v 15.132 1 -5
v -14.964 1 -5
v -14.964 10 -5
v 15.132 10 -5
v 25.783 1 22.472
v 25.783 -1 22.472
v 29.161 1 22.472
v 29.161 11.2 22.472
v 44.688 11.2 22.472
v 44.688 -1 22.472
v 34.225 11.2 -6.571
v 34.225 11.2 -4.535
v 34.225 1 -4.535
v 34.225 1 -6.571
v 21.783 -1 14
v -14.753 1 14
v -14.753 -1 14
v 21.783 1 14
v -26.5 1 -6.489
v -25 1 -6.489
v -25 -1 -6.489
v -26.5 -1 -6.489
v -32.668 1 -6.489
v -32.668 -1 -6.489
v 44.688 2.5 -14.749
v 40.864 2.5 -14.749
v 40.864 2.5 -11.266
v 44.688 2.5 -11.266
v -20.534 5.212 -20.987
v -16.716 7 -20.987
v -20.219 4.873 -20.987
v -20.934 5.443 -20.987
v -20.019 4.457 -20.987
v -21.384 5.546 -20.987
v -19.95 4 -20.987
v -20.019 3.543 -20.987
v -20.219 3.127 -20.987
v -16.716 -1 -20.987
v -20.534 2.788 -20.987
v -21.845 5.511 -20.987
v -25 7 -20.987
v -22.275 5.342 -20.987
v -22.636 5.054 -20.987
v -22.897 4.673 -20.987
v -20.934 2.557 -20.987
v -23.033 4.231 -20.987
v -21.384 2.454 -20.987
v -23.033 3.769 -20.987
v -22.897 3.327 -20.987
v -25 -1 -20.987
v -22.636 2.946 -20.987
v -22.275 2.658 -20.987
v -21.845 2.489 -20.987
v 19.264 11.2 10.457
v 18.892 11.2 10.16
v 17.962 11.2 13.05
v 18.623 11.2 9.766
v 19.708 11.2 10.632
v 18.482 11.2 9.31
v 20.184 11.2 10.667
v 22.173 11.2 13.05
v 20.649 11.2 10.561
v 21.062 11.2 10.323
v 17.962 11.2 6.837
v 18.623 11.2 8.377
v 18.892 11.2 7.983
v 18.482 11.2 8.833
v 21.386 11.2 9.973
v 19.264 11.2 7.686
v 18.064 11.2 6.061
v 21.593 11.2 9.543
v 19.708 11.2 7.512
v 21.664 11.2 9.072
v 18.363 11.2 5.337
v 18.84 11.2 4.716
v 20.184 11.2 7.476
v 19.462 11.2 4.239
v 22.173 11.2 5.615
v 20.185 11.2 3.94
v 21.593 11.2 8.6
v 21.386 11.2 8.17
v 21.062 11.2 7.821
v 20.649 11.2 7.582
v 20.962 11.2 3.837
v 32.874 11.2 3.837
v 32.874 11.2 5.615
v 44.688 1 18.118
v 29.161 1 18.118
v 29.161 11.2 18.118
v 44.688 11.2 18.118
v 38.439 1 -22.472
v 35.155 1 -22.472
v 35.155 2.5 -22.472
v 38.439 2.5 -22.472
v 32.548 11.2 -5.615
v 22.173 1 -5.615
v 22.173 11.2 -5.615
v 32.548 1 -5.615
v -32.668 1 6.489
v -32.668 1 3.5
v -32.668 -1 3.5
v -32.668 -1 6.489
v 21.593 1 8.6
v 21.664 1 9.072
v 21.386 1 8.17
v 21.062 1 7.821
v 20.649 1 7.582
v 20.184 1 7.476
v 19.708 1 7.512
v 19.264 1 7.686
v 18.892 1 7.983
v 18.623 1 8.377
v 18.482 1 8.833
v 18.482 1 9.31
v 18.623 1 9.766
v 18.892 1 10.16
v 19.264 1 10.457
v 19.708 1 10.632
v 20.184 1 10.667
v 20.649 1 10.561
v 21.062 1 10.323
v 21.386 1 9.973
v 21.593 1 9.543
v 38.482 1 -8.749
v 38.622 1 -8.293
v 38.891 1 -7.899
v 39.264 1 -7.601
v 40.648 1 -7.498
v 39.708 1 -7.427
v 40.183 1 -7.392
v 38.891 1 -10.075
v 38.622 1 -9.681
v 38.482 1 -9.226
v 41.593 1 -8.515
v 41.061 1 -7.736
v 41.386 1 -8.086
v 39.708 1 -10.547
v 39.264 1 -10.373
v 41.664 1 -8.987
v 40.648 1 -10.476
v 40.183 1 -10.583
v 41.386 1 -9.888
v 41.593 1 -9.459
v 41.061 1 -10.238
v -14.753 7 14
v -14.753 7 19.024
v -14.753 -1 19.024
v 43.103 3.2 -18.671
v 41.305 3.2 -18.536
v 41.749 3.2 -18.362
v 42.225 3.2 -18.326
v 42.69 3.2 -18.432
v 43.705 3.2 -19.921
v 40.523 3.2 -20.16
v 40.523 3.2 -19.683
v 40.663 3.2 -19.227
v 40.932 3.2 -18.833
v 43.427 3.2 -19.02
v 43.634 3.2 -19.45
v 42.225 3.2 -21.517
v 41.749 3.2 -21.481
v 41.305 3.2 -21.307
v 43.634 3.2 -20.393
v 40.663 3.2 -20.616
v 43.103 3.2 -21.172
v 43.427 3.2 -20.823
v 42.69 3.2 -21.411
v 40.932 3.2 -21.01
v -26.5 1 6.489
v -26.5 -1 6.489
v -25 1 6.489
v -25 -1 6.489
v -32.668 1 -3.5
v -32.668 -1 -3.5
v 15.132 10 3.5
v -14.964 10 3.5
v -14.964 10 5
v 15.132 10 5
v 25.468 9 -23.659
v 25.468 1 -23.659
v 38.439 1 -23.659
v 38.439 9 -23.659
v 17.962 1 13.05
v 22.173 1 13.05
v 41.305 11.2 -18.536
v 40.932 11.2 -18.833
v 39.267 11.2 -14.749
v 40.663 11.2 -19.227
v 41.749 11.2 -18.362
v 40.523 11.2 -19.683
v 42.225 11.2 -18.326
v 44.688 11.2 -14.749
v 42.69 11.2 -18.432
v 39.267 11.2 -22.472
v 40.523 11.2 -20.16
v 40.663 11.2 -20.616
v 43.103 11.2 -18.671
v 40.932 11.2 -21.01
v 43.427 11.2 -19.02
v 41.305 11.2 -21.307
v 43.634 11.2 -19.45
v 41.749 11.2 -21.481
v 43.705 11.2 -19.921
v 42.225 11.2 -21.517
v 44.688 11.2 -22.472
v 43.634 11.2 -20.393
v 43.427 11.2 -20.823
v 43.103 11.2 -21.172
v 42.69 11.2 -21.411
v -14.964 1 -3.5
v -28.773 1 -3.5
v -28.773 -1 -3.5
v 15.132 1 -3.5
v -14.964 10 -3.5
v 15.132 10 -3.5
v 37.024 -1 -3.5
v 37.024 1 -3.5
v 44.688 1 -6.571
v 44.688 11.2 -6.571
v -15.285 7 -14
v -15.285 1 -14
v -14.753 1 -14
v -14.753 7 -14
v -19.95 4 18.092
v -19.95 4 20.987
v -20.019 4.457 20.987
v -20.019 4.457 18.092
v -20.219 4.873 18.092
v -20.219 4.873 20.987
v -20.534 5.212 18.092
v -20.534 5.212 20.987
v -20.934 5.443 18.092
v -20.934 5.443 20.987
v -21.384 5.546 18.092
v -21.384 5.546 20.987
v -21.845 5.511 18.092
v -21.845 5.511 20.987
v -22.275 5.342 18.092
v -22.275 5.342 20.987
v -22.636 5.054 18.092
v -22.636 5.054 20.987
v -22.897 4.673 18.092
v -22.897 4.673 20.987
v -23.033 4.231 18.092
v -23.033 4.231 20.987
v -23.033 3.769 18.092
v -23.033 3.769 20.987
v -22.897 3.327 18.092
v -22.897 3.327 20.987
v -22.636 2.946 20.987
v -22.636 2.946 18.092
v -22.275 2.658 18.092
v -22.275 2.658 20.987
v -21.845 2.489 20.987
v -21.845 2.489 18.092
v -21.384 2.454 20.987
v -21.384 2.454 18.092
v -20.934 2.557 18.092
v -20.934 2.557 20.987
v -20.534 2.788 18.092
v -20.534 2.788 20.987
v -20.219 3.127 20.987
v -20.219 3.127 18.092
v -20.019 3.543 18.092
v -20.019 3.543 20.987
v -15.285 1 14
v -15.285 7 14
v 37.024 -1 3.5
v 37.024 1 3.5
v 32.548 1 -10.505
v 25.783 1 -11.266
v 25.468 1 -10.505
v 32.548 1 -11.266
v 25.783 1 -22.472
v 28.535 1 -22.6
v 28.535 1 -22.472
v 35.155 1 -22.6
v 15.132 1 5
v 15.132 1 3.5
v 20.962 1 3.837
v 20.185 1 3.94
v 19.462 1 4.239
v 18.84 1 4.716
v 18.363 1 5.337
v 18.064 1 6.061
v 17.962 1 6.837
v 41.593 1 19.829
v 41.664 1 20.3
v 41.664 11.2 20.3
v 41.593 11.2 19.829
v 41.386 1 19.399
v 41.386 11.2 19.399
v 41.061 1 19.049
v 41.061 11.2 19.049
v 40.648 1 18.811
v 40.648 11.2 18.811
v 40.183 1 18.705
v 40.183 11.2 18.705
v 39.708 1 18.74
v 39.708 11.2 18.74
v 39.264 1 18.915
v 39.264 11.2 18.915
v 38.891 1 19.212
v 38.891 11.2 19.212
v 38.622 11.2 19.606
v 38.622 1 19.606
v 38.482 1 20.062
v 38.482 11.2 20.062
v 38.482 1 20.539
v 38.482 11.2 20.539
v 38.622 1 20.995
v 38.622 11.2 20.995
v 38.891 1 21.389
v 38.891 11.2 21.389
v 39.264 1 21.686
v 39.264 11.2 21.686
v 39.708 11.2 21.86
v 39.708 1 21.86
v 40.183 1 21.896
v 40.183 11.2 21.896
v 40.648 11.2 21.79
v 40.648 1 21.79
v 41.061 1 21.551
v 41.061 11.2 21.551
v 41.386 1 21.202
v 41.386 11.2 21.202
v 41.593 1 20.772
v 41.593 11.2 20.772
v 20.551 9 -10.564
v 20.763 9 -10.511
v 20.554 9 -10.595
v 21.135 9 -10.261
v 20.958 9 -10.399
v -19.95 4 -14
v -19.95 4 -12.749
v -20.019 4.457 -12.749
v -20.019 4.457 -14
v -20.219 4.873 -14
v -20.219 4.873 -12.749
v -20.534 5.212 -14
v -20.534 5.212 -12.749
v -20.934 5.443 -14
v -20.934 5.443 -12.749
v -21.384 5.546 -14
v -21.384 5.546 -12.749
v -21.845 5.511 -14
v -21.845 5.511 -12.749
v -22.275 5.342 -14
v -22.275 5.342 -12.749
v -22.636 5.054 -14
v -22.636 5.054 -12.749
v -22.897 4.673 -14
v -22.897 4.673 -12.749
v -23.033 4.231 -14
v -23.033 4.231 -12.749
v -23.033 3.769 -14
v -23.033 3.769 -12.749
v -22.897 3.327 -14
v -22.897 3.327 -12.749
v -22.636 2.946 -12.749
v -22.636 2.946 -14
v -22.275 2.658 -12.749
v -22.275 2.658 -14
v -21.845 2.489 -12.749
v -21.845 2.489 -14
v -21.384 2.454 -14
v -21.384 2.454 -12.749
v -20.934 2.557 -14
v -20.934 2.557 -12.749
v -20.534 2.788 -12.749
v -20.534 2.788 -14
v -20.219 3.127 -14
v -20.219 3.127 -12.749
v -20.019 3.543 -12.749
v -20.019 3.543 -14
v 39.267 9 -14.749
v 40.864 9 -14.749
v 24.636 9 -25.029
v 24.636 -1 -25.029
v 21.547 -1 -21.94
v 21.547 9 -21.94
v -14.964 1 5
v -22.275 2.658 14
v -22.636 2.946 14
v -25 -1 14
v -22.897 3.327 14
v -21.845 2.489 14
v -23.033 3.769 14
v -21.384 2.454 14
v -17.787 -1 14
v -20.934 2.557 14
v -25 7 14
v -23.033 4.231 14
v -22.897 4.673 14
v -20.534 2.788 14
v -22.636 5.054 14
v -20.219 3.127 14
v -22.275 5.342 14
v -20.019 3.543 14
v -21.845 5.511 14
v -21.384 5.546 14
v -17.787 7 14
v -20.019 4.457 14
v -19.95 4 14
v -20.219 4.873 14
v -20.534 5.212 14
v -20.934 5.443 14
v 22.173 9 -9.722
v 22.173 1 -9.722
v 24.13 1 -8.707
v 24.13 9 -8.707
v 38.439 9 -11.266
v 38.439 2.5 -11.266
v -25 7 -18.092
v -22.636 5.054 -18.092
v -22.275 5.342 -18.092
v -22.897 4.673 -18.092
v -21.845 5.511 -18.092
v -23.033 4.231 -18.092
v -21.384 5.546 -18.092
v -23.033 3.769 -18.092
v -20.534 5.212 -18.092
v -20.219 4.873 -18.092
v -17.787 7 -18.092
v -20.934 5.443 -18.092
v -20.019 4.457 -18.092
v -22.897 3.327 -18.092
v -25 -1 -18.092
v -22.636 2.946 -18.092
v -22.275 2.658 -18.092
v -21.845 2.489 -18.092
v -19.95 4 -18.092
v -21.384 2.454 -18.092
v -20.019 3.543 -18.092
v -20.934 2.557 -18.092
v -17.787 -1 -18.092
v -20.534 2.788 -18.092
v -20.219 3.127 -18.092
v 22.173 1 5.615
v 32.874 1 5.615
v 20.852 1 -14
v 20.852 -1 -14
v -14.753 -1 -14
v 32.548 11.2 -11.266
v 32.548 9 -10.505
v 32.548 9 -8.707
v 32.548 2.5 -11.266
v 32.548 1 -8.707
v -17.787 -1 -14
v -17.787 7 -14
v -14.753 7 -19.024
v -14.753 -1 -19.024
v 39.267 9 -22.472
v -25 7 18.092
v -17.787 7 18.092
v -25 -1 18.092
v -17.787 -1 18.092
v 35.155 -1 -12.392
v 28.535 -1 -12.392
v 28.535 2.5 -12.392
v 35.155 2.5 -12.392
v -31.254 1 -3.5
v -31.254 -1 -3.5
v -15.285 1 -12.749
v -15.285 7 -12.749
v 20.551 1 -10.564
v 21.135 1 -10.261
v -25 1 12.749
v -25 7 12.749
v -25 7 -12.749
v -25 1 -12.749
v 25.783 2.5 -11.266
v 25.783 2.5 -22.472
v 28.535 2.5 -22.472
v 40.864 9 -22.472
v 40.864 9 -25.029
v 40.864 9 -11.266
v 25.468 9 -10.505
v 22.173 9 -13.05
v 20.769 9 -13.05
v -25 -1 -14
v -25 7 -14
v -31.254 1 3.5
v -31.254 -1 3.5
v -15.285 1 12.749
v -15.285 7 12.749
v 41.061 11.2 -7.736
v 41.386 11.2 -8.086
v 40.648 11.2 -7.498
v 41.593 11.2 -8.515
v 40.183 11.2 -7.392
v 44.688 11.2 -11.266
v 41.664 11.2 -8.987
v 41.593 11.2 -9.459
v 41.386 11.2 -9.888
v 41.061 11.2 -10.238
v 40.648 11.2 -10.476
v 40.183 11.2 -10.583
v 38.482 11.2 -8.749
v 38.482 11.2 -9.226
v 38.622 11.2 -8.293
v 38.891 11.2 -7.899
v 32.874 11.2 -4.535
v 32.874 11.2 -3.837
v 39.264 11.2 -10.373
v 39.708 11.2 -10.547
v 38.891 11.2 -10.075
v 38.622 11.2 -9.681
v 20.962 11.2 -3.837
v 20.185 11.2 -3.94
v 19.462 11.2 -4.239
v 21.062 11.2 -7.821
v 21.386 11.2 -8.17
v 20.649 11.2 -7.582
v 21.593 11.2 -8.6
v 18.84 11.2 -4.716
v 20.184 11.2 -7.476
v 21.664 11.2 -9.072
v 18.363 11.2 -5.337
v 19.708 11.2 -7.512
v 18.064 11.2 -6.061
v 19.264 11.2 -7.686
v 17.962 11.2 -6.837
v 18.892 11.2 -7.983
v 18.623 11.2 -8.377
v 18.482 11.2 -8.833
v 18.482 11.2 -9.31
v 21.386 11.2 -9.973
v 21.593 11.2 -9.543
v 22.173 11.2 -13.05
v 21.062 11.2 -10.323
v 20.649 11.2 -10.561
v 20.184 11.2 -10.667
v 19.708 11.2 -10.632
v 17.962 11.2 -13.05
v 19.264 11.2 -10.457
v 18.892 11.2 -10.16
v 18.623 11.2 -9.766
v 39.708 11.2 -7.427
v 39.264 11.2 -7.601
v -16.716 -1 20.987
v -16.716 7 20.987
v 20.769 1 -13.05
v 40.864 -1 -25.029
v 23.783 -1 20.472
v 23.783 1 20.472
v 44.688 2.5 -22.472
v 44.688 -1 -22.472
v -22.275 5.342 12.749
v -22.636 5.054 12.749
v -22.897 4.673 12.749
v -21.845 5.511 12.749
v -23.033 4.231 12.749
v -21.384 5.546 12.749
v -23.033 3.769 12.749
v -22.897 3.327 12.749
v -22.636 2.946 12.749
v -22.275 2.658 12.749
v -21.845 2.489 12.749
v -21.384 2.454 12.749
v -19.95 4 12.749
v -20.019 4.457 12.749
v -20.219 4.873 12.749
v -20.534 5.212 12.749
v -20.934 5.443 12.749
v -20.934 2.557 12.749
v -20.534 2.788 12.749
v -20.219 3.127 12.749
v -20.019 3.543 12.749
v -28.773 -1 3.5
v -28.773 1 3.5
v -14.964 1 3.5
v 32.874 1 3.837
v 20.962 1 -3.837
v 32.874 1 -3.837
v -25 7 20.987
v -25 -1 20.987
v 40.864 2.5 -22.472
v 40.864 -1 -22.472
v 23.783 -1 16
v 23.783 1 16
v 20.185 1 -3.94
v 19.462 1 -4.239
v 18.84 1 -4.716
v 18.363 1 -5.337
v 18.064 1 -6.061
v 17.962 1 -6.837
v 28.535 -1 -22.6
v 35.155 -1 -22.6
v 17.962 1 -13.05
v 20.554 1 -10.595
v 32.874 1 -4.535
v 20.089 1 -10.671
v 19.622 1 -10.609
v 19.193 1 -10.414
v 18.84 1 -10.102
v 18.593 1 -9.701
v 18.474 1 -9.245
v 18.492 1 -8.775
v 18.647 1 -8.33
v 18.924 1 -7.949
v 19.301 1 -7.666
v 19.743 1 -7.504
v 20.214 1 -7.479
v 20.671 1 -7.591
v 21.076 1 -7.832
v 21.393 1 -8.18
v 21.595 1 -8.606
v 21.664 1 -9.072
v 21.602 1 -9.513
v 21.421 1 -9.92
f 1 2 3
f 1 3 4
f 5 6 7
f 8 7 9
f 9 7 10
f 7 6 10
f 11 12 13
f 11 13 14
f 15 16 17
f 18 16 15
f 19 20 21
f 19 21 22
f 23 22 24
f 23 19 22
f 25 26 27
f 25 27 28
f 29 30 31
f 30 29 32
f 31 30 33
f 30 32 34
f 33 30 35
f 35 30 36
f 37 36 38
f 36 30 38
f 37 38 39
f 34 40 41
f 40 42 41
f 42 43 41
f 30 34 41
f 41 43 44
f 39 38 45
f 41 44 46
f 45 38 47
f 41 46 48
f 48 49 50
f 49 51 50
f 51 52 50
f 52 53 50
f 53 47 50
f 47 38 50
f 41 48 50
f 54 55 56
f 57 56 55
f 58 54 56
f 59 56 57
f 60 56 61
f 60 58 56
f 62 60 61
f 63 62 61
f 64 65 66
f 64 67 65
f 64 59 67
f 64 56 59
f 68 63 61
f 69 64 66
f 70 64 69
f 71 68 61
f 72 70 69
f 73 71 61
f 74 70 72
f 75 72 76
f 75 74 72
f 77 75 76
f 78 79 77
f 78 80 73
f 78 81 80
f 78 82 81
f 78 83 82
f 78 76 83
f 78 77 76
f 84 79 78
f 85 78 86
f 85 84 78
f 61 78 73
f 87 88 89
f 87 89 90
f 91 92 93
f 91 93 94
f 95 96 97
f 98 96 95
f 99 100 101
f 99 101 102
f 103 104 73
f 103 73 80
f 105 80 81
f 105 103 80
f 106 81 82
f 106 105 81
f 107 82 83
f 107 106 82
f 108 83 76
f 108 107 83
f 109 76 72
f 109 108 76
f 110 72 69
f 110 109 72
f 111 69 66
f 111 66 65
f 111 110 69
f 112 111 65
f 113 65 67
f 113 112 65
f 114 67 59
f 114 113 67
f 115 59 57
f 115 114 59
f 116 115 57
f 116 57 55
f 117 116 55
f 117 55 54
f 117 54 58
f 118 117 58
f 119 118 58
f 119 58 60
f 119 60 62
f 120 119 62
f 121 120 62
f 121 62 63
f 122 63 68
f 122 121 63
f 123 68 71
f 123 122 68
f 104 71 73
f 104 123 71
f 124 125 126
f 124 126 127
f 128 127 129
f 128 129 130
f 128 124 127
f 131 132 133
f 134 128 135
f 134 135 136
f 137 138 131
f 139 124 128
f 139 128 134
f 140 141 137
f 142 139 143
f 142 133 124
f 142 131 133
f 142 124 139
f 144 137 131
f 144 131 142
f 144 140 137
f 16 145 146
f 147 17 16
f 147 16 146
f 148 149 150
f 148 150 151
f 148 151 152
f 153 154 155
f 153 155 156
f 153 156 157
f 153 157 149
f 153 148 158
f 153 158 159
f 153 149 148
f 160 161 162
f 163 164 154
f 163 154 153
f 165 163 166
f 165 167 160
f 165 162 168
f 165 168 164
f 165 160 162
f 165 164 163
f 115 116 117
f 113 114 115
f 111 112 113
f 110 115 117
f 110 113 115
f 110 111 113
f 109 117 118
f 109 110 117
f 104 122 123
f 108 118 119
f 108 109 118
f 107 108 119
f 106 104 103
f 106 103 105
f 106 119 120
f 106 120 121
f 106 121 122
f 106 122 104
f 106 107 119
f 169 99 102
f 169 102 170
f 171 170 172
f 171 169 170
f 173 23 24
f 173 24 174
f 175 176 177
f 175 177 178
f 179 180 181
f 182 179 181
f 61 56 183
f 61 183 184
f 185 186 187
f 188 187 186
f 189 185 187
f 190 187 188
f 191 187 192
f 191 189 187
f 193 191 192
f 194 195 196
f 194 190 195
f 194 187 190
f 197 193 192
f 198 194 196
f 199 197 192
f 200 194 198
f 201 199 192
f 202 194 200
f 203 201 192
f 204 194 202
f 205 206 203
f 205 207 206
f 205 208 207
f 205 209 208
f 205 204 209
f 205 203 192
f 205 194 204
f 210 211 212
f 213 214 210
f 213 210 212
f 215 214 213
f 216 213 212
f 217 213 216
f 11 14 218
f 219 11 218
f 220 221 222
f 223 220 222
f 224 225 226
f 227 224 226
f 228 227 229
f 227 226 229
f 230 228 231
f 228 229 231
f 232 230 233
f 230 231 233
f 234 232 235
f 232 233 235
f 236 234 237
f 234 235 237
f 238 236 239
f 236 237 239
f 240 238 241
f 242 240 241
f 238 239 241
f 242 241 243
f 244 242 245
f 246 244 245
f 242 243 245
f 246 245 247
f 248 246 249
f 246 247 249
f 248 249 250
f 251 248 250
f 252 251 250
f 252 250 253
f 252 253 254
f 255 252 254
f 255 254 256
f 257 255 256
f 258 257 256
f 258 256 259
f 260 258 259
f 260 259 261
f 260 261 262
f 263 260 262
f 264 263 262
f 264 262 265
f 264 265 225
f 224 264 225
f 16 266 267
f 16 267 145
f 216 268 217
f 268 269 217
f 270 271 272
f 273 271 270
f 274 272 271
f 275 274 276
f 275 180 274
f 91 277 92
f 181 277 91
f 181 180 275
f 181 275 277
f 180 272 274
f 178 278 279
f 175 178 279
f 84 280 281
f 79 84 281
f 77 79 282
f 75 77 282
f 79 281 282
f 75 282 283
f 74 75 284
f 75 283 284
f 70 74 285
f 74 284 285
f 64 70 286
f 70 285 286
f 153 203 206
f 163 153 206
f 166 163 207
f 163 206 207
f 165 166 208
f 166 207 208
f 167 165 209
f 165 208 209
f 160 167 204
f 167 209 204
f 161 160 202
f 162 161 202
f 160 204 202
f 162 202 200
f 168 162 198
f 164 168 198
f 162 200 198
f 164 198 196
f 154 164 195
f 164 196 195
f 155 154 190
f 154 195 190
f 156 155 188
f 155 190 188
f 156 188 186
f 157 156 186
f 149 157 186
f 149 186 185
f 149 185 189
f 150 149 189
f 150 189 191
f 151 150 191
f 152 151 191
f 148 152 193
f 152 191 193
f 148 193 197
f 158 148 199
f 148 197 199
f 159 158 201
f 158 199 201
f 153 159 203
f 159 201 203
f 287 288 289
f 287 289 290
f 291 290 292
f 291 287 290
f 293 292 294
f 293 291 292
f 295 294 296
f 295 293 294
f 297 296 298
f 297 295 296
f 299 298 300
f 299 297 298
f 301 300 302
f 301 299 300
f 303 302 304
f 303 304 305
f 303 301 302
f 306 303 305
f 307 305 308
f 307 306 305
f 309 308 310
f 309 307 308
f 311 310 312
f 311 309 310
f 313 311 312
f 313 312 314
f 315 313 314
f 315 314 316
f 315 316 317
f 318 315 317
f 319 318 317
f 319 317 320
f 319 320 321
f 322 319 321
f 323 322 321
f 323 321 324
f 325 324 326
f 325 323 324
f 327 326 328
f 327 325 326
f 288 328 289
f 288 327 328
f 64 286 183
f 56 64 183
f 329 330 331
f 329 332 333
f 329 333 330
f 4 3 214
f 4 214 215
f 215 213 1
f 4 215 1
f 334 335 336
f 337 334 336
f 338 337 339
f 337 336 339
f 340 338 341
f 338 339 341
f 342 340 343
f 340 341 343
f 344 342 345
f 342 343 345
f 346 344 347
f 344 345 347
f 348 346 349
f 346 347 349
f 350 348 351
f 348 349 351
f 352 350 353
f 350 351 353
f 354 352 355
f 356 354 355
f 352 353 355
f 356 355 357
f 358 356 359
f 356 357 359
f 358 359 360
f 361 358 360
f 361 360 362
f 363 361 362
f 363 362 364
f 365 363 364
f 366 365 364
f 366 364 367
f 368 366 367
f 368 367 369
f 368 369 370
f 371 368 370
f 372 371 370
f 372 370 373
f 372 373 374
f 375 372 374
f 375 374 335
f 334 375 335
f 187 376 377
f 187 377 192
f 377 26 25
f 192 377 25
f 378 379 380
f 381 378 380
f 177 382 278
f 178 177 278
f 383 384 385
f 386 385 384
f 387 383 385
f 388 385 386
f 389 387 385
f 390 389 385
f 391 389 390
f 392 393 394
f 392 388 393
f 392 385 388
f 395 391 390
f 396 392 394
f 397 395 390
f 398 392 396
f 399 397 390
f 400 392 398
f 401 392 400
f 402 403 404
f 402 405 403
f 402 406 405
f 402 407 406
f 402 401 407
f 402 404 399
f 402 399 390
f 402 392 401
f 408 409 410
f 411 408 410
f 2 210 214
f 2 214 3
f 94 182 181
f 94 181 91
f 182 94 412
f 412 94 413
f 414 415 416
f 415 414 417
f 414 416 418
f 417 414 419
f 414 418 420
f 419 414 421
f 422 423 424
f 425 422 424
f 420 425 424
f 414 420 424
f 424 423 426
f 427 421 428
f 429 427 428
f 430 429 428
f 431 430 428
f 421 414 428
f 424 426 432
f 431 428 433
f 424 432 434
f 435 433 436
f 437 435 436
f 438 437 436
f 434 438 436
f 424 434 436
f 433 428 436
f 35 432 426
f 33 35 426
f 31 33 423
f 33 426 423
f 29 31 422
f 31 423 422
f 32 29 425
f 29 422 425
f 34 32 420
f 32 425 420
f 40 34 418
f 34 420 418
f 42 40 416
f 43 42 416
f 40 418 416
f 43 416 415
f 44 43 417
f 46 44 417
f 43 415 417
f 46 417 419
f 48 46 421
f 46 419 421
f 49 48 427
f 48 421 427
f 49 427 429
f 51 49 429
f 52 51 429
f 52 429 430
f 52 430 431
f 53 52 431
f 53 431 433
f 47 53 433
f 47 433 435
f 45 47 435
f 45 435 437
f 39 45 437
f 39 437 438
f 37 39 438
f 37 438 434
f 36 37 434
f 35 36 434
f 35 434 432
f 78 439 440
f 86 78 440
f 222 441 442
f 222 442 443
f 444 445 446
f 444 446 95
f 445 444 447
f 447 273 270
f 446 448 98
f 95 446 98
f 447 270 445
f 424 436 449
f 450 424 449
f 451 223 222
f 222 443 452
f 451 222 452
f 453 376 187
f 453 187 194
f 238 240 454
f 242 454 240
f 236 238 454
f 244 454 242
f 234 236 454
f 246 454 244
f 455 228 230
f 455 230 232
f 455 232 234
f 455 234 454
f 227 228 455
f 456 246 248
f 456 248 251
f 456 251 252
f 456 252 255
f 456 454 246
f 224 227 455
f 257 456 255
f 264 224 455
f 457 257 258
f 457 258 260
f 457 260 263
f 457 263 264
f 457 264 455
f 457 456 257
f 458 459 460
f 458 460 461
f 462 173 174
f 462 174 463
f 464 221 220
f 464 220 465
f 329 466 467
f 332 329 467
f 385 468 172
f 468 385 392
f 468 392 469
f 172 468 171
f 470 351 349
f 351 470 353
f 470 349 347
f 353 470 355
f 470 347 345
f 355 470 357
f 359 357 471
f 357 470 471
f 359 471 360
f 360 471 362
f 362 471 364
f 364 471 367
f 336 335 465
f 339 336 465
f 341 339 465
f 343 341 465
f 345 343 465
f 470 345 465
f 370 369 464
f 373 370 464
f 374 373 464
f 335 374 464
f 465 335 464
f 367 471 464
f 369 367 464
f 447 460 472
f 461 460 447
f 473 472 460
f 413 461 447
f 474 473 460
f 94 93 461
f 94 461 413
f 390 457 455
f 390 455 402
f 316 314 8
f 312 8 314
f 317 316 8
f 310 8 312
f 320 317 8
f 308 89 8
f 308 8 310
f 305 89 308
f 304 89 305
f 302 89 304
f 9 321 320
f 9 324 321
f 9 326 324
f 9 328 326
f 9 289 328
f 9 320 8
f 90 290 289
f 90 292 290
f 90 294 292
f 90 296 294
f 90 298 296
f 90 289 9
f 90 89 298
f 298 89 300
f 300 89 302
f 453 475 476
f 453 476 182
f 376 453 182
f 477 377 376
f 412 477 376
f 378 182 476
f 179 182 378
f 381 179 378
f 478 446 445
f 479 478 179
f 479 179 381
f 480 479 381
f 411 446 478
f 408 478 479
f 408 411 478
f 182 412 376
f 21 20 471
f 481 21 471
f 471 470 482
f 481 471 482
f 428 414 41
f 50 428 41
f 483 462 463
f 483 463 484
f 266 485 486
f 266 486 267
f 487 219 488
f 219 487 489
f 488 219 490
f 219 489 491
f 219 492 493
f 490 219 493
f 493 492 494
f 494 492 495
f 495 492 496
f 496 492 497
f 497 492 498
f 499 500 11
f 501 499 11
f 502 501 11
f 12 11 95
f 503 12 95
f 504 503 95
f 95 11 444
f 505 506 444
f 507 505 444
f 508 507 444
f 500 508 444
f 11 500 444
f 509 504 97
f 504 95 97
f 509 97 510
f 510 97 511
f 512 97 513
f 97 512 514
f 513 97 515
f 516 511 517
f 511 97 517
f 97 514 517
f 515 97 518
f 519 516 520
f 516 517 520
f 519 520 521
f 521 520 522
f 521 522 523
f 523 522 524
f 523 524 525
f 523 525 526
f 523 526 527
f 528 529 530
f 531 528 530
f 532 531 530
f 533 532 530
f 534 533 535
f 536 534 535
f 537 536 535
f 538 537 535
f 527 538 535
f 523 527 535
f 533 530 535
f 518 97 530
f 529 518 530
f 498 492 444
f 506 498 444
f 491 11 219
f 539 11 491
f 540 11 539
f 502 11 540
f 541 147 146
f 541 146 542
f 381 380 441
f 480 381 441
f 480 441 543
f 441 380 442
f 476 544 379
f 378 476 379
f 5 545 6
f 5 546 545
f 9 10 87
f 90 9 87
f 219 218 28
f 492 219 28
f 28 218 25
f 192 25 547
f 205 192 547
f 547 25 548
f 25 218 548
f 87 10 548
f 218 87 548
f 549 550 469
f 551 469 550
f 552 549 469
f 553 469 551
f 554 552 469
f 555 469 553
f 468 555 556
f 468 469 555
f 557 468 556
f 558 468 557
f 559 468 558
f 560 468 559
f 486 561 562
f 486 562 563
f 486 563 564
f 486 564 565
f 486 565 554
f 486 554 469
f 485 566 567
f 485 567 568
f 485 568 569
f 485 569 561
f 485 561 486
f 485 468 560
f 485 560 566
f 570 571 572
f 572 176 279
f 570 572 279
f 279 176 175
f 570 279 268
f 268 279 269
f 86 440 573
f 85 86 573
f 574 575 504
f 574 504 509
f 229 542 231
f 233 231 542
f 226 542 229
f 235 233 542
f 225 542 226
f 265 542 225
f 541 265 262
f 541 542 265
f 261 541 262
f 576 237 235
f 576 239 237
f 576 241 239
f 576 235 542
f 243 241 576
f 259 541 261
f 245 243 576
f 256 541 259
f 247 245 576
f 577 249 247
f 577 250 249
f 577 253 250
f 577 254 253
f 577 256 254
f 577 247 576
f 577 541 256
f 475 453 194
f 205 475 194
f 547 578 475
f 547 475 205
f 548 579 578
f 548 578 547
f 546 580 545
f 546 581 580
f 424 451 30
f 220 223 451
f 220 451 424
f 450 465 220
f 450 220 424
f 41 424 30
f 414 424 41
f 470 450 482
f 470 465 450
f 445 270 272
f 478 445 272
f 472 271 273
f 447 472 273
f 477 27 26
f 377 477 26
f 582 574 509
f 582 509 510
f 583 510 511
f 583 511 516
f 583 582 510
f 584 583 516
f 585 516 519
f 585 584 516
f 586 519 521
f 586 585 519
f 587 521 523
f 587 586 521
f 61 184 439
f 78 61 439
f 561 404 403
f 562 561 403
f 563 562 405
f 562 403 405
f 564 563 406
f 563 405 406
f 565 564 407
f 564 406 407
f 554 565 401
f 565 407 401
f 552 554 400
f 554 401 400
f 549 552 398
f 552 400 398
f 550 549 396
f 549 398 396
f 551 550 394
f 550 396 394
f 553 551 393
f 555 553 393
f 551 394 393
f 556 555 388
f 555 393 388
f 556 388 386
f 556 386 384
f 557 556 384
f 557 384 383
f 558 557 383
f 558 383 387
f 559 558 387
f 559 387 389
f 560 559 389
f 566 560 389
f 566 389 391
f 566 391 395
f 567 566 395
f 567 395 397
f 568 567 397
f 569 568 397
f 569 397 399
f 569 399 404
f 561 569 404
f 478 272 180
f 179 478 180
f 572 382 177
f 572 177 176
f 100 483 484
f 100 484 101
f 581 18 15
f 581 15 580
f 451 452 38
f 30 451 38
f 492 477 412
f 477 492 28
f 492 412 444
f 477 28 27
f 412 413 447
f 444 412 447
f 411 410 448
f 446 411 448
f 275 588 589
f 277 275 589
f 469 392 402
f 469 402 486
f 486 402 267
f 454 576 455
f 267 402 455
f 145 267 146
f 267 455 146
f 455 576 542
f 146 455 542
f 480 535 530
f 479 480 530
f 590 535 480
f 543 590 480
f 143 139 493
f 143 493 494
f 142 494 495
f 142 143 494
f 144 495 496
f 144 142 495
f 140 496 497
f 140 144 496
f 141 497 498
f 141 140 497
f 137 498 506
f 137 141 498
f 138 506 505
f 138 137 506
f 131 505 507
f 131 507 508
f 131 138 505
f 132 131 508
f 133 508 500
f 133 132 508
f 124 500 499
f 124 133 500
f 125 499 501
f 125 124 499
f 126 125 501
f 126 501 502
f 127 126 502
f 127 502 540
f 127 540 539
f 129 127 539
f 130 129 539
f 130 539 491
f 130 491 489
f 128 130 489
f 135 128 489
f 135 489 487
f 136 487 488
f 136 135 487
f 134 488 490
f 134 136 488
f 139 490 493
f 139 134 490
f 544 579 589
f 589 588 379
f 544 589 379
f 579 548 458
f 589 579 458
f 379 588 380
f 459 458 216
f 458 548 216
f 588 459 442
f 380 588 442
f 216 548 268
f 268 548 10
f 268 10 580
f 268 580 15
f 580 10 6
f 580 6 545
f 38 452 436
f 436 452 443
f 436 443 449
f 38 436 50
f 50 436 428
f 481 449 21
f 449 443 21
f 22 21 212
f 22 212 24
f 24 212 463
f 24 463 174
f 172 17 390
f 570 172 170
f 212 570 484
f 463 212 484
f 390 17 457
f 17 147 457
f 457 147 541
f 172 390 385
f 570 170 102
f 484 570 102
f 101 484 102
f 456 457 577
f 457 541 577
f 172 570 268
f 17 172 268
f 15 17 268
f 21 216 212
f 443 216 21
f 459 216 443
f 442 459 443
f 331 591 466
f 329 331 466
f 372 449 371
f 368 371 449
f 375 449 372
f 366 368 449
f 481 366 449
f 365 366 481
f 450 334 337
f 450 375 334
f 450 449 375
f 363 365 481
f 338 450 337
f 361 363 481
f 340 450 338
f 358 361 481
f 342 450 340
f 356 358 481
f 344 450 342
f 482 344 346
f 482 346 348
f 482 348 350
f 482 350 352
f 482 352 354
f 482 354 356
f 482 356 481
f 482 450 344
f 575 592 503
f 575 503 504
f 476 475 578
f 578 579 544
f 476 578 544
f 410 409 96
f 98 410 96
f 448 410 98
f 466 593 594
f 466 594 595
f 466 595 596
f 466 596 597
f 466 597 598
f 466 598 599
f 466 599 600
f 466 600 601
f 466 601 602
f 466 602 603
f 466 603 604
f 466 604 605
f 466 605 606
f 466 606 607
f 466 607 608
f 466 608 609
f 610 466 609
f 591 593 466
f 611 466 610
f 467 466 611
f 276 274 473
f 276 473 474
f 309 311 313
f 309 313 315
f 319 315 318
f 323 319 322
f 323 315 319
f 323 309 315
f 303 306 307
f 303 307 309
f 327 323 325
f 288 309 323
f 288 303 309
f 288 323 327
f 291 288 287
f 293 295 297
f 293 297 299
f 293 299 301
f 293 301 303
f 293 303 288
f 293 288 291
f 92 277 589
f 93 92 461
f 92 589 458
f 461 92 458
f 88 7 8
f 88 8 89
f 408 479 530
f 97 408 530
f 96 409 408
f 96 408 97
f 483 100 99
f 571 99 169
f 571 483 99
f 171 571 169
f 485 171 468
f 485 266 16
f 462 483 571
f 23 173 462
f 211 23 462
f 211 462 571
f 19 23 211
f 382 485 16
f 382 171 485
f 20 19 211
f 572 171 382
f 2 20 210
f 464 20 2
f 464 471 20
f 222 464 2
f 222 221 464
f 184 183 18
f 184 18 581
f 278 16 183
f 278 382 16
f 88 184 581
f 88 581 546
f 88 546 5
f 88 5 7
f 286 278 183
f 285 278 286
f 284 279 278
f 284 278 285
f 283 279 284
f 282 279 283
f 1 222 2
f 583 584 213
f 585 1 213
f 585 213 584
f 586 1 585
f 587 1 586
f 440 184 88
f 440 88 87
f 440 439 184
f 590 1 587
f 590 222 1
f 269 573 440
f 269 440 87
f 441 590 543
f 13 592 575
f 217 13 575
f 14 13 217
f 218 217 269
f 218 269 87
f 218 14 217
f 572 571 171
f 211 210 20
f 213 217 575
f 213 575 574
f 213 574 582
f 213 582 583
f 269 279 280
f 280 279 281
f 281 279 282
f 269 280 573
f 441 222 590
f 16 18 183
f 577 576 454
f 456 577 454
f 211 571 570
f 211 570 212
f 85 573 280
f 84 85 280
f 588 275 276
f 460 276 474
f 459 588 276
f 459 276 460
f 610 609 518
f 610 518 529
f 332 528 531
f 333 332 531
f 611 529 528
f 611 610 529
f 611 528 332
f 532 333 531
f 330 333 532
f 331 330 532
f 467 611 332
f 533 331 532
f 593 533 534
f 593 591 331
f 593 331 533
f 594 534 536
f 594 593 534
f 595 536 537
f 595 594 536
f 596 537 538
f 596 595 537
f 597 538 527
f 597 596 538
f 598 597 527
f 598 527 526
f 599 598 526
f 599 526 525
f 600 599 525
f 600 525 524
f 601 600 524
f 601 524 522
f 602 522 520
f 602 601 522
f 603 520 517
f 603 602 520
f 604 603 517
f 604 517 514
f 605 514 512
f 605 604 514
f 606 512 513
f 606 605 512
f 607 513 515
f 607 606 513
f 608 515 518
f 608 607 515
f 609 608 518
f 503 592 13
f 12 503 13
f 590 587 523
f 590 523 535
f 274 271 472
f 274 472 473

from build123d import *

# Parameters (mm, degrees)
SKETCH_1_W          = 65.796682854
SKETCH_1_H          = 7
EXTRUDE_1_DEPTH     = 1
SKETCH_1_3_W        = 65.796682854
SKETCH_1_3_H        = 7
EXTRUDE_4_DEPTH     = 1
SKETCH_2_R          = 1.6
SKETCH_2_W          = 15.527024866
SKETCH_2_H          = 4.354426868
EXTRUDE_5_DEPTH     = 10.2
SKETCH_3_W          = 11.091265895
SKETCH_3_H          = 1.250873396
EXTRUDE_6_DEPTH     = 8
EXTRUDE_7_DEPTH     = 8
SKETCH_5_R          = 1.55
CUT_EXTRUDE_1_DEPTH = 46.168181955
SKETCH_6_W          = 30.095890068
SKETCH_6_H          = 1.5
EXTRUDE_8_DEPTH     = 9
SKETCH_9_R          = 1.6
EXTRUDE_9_DEPTH     = 10.2
SKETCH_10_W         = 18.90463159
SKETCH_10_H         = 11.206527224
EXTRUDE_10_DEPTH    = 1.5
EXTRUDE_11_DEPTH    = 10
SKETCH_12_W         = 6.619618948
SKETCH_12_H         = 10.208127021
CUT_EXTRUDE_2_DEPTH = 4
SKETCH_13_W         = 5.420961308
SKETCH_13_H         = 7.723522143
EXTRUDE_12_DEPTH    = 8.7
SKETCH_14_R         = 1.6
CUT_EXTRUDE_3_DEPTH = 8
SKETCH_15_W         = 1.5
SKETCH_15_H         = 14.498100707
CUT_EXTRUDE_4_DEPTH = 9


with BuildPart() as part:
    # 草图1 → 凸台-拉伸1 (new body)
    with BuildSketch(Plane(origin=(0, 0, 0), x_dir=(1, 0, 0), z_dir=(0, 1, 0))):
        Polygon((21.783137071, 14), (-26.5, 14), (-26.5, 6.489174383), (-32.668192158, 6.489174383), (-32.668192158, 4.906407062), (-32.668192158, 3.5), (-31.253928934, 3.5), (-31.253928934, -3.5), (-32.668192158, -3.5), (-32.668192158, -4.906407062), (-32.668192158, -6.489174383), (-26.5, -6.489174383), (-26.5, -14), (21.783137071, -14), (23.783137071, -16), (23.783137071, -20.472436035), (25.783137071, -22.472436035), (44.687768661, -22.472436035), (44.687768661, -14), (44.687768661, 14), (44.687768661, 22.472436035), (39.670641652, 22.472436035), (39.670641652, 24.180906865), (37.700847745, 24.180906865), (25.783137071, 24.180906865), (23.783137071, 21.491786563), (23.783137071, 20.472436035), (23.783137071, 16), align=None)
        with Locations((4.125276897, 0)):
            Rectangle(SKETCH_1_W, SKETCH_1_H, mode=Mode.SUBTRACT)
    extrude(amount=EXTRUDE_1_DEPTH)

    # 草图1<3> → 凸台-拉伸4 (add)
    with BuildSketch(Plane(origin=(0, 0, 0), x_dir=(1, 0, 0), z_dir=(0, 1, 0))):
        Polygon((21.783137071, 14), (-26.5, 14), (-26.5, 6.489174383), (-32.668192158, 6.489174383), (-32.668192158, 4.906407062), (-32.668192158, 3.5), (-31.253928934, 3.5), (-31.253928934, -3.5), (-32.668192158, -3.5), (-32.668192158, -4.906407062), (-32.668192158, -6.489174383), (-26.5, -6.489174383), (-26.5, -14), (21.783137071, -14), (23.783137071, -16), (23.783137071, -20.472436035), (25.783137071, -22.472436035), (44.687768661, -22.472436035), (44.687768661, -14), (44.687768661, 14), (44.687768661, 22.472436035), (39.670641652, 22.472436035), (39.670641652, 24.180906865), (37.700847745, 24.180906865), (25.783137071, 24.180906865), (23.783137071, 21.491786563), (23.783137071, 20.472436035), (23.783137071, 16), align=None)
        with Locations((4.125276897, 0)):
            Rectangle(SKETCH_1_3_W, SKETCH_1_3_H, mode=Mode.SUBTRACT)
    extrude(amount=-EXTRUDE_4_DEPTH)

    # 草图2 → 凸台-拉伸5 (add)
    with BuildSketch(Plane(origin=(0, 1, 0), x_dir=(1, 0, 0), z_dir=(0, 1, 0))):
        with BuildLine():
            Line((32.873825551, -3.837422495), (20.961538439, -3.837422495))
            ThreePointArc((20.961538439, -3.837422495), (18.840218096, -4.716102152), (17.961538439, -6.837422495))
            Line((17.961538439, -6.837422495), (17.961538439, -9.071638955))
            Line((17.961538439, -9.071638955), (17.961538439, -13.050495751))
            Line((17.961538439, -13.050495751), (22.173089039, -13.050495751))
            Line((22.173089039, -13.050495751), (22.173089039, -9.071638955))
            Line((22.173089039, -9.071638955), (22.173089039, -5.615284864))
            Line((22.173089039, -5.615284864), (32.873825551, -5.615284864))
            Line((32.873825551, -5.615284864), (32.873825551, -3.837422495))
        make_face()
        with Locations((20.064403013, -9.071638955)):
            Circle(SKETCH_2_R, mode=Mode.SUBTRACT)
        Polygon((34.225317019, 6.570554911), (44.687768661, 6.570554911), (44.687768661, 11.265908811), (32.547793792, 11.265908811), (32.547793792, 4.534516494), (34.225317019, 4.534516494), align=None)
        with Locations((40.063673511, 8.987084634)):
            Circle(SKETCH_2_R, mode=Mode.SUBTRACT)
        with Locations((36.924256228, -20.295222601)):
            Rectangle(SKETCH_2_W, SKETCH_2_H)
        with Locations((40.063673511, -20.300345076)):
            Circle(SKETCH_2_R, mode=Mode.SUBTRACT)
    extrude(amount=EXTRUDE_5_DEPTH)

    # 草图3 → 凸台-拉伸6 (add)
    with BuildSketch(Plane.XZ.offset(1)):
        with Locations((-20.830181881, -13.374563302)):
            Rectangle(SKETCH_3_W, SKETCH_3_H)
        with Locations((-20.830181881, 13.374563302)):
            Rectangle(SKETCH_3_W, SKETCH_3_H)
    extrude(amount=-EXTRUDE_6_DEPTH)

    # 草图4 → 凸台-拉伸7 (add)
    with BuildSketch(Plane.XZ.offset(1)):
        Polygon((-14.752508247, -14), (-14.752508247, -19.024004183), (-16.715779154, -20.98727509), (-26.5, -20.98727509), (-26.5, -18.091791799), (-17.787107971, -18.091791799), (-17.787107971, -14), align=None)
        Polygon((-26.5, 20.98727509), (-26.5, 18.091791799), (-17.787107971, 18.091791799), (-17.787107971, 14), (-14.752508247, 14), (-14.752508247, 19.024004183), (-16.715779154, 20.98727509), align=None)
    extrude(amount=-EXTRUDE_7_DEPTH)

    # 草图5 → 切除-拉伸1 (cut, through all)
    with BuildSketch(Plane.XY.offset(20.98727509)):
        with Locations((-21.5, 4)):
            Circle(SKETCH_5_R)
    extrude(amount=-CUT_EXTRUDE_1_DEPTH, mode=Mode.SUBTRACT)

    # 草图6 → 凸台-拉伸8 (add)
    with BuildSketch(Plane(origin=(0, 1, 0), x_dir=(1, 0, 0), z_dir=(0, 1, 0))):
        with Locations((0.084132632, 4.25)):
            Rectangle(SKETCH_6_W, SKETCH_6_H)
        with Locations((0.084132632, -4.25)):
            Rectangle(SKETCH_6_W, SKETCH_6_H)
    extrude(amount=EXTRUDE_8_DEPTH)

    # 草图9 → 凸台-拉伸9 (add)
    with BuildSketch(Plane(origin=(0, 1, 0), x_dir=(1, 0, 0), z_dir=(0, 1, 0))):
        with BuildLine():
            Line((17.961538439, 6.837422495), (17.961538439, 13.050495751))
            Line((17.961538439, 13.050495751), (22.173089039, 13.050495751))
            Line((22.173089039, 13.050495751), (22.173089039, 5.615284864))
            Line((22.173089039, 5.615284864), (32.873825551, 5.615284864))
            Line((32.873825551, 5.615284864), (32.873825551, 3.837422495))
            Line((32.873825551, 3.837422495), (20.961538439, 3.837422495))
            ThreePointArc((20.961538439, 3.837422495), (18.840218096, 4.716102152), (17.961538439, 6.837422495))
        make_face()
        with Locations((20.064403013, 9.071638955)):
            Circle(SKETCH_9_R, mode=Mode.SUBTRACT)
    extrude(amount=EXTRUDE_9_DEPTH)

    # 草图10 → 凸台-拉伸10 (add)
    with BuildSketch(Plane(origin=(0, 1, 0), x_dir=(1, 0, 0), z_dir=(0, 1, 0))):
        with Locations((35.235452866, 16.869172423)):
            Rectangle(SKETCH_10_W, SKETCH_10_H)
    extrude(amount=EXTRUDE_10_DEPTH)

    # 草图11 → 凸台-拉伸11 (add)
    with BuildSketch(Plane.XZ.offset(1)):
        Polygon((32.547793792, -10.505295771), (25.467909356, -10.505295771), (25.467909356, -23.65934808), (38.4386145, -23.65934808), (38.4386145, -11.265908811), (40.863684521, -11.265908811), (40.863684521, -25.029182917), (24.636389842, -25.029182917), (21.547173342, -21.939966418), (20.550925149, -10.56366418), (24.129557088, -8.707277705), (32.547793792, -8.707277705), align=None)
    extrude(amount=-EXTRUDE_11_DEPTH)

    # 草图12 → 切除-拉伸2 (cut)
    with BuildSketch(Plane.XZ.offset(1)):
        with Locations((31.84517955, -17.496385448)):
            Rectangle(SKETCH_12_W, SKETCH_12_H)
    extrude(amount=-CUT_EXTRUDE_2_DEPTH, mode=Mode.SUBTRACT)

    # 草图13 → 凸台-拉伸12 (add)
    with BuildSketch(Plane(origin=(0, 2.5, 0), x_dir=(1, 0, 0), z_dir=(0, 1, 0))):
        with Locations((41.977288007, 18.610674964)):
            Rectangle(SKETCH_13_W, SKETCH_13_H)
    extrude(amount=EXTRUDE_12_DEPTH)

    # 草图14 → 切除-拉伸3 (cut)
    with BuildSketch(Plane(origin=(0, 11.2, 0), x_dir=(1, 0, 0), z_dir=(0, 1, 0))):
        with Locations((42.105027807, 19.921488723)):
            Circle(SKETCH_14_R)
    extrude(amount=-CUT_EXTRUDE_3_DEPTH, mode=Mode.SUBTRACT)

    # 草图15 → 切除-拉伸4 (cut, through all)
    with BuildSketch(Plane(origin=(0, 7, 0), x_dir=(1, 0, 0), z_dir=(0, 1, 0))):
        with Locations((-25.75, 13.738224737)):
            Rectangle(SKETCH_15_W, SKETCH_15_H)
        with Locations((-25.75, -13.738224737)):
            Rectangle(SKETCH_15_W, SKETCH_15_H)
    extrude(amount=-CUT_EXTRUDE_4_DEPTH, mode=Mode.SUBTRACT)


solid = part.part
